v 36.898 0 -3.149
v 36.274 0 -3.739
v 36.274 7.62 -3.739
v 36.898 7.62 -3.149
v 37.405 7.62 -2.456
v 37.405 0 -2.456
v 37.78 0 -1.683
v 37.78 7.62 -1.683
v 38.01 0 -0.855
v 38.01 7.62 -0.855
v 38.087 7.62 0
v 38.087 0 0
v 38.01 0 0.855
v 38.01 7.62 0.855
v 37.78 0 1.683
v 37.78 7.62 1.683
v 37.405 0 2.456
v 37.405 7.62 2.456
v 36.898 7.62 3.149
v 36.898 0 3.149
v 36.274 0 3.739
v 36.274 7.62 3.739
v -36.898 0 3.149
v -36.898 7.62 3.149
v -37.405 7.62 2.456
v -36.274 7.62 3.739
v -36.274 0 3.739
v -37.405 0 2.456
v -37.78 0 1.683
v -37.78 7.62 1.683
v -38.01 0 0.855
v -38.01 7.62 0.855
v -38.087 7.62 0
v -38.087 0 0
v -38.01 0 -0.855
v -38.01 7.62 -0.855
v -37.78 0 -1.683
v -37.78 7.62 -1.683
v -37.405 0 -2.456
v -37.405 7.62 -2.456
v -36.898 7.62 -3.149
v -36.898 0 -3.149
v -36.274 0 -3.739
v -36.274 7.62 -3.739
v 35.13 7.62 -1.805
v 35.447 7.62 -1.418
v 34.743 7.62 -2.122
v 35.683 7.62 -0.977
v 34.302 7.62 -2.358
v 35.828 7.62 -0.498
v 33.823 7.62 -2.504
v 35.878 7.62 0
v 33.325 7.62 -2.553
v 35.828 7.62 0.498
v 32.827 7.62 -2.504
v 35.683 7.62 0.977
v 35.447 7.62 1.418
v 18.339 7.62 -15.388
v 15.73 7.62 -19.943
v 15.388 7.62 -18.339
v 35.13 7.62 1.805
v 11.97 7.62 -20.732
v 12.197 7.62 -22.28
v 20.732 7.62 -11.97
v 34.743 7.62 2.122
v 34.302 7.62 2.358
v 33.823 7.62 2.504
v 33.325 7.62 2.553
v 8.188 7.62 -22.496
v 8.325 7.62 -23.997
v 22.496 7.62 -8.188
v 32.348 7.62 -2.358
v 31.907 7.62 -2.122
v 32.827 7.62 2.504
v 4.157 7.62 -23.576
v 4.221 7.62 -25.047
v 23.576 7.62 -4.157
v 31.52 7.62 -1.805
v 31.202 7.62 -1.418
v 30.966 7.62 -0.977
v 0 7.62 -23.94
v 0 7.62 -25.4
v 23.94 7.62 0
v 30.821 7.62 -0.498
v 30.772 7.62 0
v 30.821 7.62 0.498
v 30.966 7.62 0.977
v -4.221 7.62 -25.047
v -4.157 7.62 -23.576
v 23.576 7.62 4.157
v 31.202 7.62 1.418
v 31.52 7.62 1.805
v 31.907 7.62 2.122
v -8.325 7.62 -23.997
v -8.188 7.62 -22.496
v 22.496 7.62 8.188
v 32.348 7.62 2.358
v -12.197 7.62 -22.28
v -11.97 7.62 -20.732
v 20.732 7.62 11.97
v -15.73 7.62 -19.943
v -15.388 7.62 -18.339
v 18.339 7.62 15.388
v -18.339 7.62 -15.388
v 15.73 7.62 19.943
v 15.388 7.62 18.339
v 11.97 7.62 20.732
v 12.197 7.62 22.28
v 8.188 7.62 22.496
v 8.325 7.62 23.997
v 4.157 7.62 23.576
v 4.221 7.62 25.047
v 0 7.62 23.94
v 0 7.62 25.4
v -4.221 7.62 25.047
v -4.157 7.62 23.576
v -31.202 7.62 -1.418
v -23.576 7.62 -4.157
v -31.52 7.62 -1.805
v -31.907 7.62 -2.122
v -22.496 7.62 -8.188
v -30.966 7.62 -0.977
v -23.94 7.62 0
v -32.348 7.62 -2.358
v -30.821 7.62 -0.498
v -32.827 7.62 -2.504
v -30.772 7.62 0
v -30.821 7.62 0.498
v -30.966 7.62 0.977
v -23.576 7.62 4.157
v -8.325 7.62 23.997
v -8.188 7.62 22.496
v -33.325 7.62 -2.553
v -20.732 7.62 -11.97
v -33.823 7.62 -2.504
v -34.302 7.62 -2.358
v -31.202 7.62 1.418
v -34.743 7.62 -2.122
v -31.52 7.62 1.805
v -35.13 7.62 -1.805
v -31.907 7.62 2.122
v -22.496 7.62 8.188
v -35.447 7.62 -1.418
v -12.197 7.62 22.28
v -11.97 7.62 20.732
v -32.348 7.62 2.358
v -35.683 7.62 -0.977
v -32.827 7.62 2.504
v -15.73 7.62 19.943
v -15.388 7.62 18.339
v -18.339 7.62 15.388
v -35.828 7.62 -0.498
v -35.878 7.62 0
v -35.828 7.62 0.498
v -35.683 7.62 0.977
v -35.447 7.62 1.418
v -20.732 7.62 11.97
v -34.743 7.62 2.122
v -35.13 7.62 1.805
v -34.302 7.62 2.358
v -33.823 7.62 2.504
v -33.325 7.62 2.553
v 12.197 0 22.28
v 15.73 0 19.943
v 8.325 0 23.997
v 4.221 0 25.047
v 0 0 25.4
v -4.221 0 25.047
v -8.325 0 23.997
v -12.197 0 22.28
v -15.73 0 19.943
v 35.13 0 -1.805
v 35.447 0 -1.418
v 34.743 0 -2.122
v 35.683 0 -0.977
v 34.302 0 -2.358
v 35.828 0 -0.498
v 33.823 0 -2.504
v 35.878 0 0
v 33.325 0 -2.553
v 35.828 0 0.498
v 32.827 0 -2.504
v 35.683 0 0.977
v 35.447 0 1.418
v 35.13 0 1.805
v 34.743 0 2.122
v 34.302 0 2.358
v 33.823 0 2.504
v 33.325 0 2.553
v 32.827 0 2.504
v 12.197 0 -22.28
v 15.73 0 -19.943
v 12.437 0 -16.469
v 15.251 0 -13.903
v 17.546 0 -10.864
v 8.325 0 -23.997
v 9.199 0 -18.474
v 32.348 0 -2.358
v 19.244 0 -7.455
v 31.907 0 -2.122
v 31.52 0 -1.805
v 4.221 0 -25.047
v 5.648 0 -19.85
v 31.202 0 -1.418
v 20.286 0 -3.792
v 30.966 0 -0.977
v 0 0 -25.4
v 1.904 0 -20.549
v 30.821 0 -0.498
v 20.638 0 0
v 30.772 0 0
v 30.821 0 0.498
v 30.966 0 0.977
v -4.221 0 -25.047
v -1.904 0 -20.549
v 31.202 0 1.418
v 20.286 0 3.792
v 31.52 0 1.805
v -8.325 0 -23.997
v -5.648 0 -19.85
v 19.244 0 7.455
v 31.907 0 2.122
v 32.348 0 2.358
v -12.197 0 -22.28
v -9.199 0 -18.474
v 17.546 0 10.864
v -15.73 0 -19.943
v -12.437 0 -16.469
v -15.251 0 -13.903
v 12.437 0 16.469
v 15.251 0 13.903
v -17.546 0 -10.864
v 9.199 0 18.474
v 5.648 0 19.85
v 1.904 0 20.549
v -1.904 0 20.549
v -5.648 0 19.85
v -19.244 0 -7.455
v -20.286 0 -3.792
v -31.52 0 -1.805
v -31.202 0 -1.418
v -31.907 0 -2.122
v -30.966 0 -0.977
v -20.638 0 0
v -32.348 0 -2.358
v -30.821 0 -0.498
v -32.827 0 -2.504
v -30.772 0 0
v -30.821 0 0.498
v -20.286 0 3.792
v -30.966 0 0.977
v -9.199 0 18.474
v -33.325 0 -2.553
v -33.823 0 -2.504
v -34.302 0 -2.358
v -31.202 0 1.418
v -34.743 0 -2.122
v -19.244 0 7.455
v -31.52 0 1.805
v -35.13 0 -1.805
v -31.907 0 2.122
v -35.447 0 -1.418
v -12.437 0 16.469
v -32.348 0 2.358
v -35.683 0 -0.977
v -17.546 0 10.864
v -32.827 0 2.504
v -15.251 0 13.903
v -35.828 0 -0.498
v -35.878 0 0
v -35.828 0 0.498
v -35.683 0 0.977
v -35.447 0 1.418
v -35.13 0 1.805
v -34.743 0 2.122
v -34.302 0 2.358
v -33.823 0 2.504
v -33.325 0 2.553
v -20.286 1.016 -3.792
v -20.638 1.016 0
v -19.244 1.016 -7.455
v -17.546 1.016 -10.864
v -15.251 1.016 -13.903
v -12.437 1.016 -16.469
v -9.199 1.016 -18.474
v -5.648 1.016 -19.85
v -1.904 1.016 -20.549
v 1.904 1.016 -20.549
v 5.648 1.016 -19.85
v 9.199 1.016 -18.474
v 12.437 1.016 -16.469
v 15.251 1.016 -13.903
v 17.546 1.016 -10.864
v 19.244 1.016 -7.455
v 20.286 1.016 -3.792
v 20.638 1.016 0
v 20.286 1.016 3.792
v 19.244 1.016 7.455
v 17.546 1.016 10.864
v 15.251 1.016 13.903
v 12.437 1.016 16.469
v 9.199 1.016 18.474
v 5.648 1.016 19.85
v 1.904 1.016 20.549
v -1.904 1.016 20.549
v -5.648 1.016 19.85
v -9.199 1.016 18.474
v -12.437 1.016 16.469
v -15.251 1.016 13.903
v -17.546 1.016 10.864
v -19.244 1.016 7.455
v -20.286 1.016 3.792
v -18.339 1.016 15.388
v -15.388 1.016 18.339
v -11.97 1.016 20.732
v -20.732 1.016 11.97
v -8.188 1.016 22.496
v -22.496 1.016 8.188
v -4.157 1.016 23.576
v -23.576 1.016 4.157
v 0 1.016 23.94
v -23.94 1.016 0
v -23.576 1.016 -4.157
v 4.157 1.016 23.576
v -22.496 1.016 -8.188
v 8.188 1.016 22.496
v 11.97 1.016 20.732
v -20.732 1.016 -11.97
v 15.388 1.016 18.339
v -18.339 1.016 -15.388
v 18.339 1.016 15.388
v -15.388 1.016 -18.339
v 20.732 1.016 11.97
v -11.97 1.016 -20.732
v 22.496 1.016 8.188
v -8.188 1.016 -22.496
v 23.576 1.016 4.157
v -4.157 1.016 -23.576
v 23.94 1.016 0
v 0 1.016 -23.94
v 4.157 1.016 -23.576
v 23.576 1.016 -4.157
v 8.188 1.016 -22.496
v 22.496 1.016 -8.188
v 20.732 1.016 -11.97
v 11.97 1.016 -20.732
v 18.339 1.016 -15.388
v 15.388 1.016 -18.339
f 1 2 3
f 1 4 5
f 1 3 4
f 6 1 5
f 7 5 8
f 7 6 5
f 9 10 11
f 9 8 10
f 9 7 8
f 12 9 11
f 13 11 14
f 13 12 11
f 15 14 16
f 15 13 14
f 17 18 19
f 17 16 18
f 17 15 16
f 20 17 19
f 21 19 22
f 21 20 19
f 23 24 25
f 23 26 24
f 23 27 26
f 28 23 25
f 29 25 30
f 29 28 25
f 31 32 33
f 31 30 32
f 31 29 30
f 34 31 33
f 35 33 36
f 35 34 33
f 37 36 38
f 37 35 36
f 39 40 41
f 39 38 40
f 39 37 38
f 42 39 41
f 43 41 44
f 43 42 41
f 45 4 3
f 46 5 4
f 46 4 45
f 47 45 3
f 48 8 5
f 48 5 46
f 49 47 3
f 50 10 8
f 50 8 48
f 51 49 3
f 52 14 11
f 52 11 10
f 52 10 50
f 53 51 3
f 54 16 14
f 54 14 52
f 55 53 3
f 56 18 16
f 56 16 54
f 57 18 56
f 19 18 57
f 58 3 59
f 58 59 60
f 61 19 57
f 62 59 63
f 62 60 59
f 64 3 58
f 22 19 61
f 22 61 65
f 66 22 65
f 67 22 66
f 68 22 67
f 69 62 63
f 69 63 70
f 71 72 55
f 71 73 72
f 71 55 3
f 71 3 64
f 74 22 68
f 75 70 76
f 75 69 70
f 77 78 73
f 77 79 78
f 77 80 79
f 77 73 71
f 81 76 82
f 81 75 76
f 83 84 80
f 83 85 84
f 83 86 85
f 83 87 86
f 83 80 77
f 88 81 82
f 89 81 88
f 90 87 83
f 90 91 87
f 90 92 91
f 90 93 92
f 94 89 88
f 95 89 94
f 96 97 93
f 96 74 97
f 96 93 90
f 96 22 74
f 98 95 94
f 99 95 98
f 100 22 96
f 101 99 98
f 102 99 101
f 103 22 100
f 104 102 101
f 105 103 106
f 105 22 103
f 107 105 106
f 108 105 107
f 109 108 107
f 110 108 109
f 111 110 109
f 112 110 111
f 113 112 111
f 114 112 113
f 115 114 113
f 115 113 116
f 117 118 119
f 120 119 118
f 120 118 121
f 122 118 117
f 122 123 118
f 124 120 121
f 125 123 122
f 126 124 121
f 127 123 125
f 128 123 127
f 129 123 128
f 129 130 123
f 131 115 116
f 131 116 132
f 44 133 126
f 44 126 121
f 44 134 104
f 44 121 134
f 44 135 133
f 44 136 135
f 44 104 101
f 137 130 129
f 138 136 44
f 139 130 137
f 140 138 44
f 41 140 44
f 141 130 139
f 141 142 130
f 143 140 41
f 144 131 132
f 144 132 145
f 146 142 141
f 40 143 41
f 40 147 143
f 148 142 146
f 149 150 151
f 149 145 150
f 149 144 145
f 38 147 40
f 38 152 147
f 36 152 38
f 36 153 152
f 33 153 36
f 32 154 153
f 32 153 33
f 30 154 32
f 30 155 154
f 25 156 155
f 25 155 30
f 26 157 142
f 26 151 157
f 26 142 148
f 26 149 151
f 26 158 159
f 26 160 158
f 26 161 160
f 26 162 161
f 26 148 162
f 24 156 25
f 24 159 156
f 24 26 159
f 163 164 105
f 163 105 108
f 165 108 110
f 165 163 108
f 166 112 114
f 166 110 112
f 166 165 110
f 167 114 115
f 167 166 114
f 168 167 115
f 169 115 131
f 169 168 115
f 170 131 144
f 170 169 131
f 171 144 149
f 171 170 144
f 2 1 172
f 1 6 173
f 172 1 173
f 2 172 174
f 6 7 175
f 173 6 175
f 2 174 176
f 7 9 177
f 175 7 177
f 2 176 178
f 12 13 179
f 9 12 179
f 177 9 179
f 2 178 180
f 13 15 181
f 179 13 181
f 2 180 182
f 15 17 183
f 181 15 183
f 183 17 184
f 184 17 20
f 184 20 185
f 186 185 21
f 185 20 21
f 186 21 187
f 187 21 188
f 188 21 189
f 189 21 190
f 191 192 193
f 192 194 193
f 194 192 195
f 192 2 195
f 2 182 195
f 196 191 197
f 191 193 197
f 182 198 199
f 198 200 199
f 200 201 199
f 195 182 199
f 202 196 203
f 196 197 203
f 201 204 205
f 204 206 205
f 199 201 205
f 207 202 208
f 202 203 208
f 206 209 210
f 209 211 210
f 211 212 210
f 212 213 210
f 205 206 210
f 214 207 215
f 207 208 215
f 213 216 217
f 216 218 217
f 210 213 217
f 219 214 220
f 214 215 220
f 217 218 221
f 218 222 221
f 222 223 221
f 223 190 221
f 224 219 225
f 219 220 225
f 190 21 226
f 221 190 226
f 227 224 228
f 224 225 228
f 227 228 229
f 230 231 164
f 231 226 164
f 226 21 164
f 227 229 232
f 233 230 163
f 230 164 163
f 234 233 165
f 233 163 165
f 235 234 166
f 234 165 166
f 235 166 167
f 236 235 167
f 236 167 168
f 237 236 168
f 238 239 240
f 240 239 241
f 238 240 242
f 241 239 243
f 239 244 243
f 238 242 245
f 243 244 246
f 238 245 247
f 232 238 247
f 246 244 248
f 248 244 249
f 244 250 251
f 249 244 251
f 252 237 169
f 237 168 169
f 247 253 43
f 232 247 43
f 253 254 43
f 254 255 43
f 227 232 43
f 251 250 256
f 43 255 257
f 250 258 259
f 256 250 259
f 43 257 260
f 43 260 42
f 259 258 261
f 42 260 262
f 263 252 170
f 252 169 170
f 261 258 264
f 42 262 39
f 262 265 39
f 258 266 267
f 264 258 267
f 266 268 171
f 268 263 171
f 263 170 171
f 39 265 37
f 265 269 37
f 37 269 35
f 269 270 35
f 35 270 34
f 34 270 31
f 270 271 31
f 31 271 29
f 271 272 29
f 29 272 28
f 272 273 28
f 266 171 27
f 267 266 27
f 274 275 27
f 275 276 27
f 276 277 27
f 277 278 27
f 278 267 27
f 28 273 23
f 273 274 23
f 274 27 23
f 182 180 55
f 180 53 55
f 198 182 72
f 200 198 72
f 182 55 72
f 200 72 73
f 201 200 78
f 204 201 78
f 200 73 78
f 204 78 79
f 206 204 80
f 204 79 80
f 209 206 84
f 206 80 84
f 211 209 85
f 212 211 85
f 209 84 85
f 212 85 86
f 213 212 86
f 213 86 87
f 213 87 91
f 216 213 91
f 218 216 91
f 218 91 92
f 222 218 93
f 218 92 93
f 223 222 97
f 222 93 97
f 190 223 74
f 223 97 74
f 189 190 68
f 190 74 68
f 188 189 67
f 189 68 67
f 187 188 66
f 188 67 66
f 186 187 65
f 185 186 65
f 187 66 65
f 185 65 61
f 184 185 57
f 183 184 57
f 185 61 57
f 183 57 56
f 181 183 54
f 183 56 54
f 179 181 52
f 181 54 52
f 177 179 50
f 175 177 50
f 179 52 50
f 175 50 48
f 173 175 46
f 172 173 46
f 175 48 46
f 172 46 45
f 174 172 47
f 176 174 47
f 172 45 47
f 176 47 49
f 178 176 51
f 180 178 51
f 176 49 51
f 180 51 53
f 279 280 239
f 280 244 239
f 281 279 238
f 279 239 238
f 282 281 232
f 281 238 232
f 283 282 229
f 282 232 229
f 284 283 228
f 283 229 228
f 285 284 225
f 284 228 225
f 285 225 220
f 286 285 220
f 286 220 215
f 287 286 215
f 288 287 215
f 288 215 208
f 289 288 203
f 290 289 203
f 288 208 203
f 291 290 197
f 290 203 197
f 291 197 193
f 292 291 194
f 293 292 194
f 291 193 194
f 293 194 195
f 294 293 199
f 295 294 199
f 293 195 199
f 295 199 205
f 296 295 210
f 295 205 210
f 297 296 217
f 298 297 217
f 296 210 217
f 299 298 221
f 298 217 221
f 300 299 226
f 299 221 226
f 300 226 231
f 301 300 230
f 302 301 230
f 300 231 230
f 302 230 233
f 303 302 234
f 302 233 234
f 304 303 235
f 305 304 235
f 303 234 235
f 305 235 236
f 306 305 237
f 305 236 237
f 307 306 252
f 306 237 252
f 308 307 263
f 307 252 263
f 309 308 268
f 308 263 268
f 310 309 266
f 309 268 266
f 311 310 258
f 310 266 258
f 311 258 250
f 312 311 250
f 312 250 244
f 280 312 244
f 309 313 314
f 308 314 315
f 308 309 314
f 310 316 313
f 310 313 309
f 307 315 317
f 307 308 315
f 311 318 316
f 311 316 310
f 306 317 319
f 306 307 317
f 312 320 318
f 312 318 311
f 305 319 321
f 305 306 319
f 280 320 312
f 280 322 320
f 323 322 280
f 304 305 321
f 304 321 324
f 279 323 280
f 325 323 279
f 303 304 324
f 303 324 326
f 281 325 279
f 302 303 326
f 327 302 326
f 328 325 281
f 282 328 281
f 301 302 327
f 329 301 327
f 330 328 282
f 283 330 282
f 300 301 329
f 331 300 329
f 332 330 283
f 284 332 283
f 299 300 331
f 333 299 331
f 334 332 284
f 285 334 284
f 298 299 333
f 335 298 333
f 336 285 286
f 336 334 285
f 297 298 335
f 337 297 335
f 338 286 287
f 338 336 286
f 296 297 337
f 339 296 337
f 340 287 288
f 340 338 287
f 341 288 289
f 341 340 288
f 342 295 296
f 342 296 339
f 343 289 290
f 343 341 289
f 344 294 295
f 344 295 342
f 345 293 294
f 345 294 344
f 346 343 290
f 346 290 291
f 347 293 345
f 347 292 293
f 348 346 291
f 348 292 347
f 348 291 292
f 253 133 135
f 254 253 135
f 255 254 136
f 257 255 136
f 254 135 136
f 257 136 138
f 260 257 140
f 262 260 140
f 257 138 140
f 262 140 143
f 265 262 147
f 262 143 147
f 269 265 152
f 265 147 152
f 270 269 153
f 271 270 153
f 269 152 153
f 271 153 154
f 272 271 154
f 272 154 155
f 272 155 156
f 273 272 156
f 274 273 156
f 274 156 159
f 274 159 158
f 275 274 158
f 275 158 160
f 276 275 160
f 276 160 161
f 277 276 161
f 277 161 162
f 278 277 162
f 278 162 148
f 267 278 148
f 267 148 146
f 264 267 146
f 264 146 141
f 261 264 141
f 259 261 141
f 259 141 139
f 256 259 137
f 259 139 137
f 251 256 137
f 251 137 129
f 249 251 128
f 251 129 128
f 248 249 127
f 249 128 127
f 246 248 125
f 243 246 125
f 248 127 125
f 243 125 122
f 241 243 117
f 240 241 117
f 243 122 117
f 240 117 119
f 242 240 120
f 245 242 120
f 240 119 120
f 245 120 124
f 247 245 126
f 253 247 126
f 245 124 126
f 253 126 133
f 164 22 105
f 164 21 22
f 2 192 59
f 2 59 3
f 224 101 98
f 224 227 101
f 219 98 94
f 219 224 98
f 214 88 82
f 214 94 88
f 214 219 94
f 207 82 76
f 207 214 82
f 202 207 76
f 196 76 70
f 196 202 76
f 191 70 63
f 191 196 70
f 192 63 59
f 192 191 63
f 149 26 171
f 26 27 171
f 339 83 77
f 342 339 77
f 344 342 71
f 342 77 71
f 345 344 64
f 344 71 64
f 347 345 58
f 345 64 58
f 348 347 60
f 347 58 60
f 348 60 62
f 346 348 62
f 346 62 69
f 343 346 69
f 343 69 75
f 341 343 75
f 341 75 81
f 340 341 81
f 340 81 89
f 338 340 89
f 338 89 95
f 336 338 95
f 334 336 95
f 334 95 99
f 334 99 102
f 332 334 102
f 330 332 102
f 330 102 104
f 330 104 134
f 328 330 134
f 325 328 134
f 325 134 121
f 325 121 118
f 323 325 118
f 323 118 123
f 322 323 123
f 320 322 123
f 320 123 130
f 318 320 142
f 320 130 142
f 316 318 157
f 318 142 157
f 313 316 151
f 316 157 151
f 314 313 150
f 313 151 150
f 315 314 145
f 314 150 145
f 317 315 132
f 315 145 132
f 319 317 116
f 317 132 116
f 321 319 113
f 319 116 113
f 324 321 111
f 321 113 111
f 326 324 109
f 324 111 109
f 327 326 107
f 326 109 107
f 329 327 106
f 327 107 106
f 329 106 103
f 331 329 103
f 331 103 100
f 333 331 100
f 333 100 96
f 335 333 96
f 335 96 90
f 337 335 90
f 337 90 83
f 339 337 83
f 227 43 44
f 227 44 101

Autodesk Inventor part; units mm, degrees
ref_plane "YZ Plane" through (0, 0, 0) normal (1, 0, 0) x (0, 1, 0)
ref_plane "XZ Plane" through (0, 0, 0) normal (0, 1, 0) x (-1, 0, 0)
ref_plane "XY Plane" through (0, 0, 0) normal (0, 0, 1) x (1, 0, 0)
sketch "Sketch1" plane through (0, 0, 0) normal (0, 1, 0) x (-1, 0, 0)
  circle A0 centre (0, 0) radius 23.8125 construction
  line L0 (33.3248, 0) -> (-33.3248, 0) construction
  circle A1 centre (33.3248, 0) radius 4.7625 construction
  circle A2 centre (-33.3248, 0) radius 4.7625 construction
  circle A3 centre (0, 0) radius 20.6375
  circle A4 centre (0, 0) radius 25.4 construction
  line L1 (36.2741, 3.7394) -> (15.7298, 19.9433)
  line L2 (36.2741, -3.7394) -> (15.7298, -19.9433)
  line L3 (-15.7298, -19.9433) -> (-36.2741, -3.7394)
  line L4 (-36.2741, 3.7394) -> (-15.7298, 19.9433)
  arc A5 (15.7298, 19.9433) -> (-15.7298, 19.9433) centre (0, 0) ccw
  arc A6 (-15.7298, -19.9433) -> (15.7298, -19.9433) centre (0, 0) ccw
  arc A7 (36.2741, -3.7394) -> (36.2741, 3.7394) centre (33.3248, 0) ccw
  arc A8 (-36.2741, 3.7394) -> (-36.2741, -3.7394) centre (-33.3248, 0) ccw
  point P0 (-36.2741, -3.7394)
  dimension "d0" = 47.625
  dimension "d1" = 33.3248
  dimension "d2" = 9.525
  dimension "d3" = 3.175
  dimension "d4" = 1.5875
extrude "Extrusion1" add sketch "Sketch1" along normal blind 7.62
sketch "Sketch2" plane through (0, 7.62, 0) normal (0, 1, 0) x (1, 0, 0)
  circle A0 centre (0, 0) radius 23.9395
  dimension "d7" = 47.879
extrude "Extrusion2" cut sketch "Sketch2" against normal blind 6.604
hole "Hole1" at (-33.3248, 0, 0) at (33.3248, 0, 0) direction (0, 1, 0) diameter 5.1054 end through all clearance for "Flat Head Machine Screw (82)" size "#10" standard "Ansi Unified Screw Threads"
properties part number "EL2-CGB-008" material "Aluminum 6061"
